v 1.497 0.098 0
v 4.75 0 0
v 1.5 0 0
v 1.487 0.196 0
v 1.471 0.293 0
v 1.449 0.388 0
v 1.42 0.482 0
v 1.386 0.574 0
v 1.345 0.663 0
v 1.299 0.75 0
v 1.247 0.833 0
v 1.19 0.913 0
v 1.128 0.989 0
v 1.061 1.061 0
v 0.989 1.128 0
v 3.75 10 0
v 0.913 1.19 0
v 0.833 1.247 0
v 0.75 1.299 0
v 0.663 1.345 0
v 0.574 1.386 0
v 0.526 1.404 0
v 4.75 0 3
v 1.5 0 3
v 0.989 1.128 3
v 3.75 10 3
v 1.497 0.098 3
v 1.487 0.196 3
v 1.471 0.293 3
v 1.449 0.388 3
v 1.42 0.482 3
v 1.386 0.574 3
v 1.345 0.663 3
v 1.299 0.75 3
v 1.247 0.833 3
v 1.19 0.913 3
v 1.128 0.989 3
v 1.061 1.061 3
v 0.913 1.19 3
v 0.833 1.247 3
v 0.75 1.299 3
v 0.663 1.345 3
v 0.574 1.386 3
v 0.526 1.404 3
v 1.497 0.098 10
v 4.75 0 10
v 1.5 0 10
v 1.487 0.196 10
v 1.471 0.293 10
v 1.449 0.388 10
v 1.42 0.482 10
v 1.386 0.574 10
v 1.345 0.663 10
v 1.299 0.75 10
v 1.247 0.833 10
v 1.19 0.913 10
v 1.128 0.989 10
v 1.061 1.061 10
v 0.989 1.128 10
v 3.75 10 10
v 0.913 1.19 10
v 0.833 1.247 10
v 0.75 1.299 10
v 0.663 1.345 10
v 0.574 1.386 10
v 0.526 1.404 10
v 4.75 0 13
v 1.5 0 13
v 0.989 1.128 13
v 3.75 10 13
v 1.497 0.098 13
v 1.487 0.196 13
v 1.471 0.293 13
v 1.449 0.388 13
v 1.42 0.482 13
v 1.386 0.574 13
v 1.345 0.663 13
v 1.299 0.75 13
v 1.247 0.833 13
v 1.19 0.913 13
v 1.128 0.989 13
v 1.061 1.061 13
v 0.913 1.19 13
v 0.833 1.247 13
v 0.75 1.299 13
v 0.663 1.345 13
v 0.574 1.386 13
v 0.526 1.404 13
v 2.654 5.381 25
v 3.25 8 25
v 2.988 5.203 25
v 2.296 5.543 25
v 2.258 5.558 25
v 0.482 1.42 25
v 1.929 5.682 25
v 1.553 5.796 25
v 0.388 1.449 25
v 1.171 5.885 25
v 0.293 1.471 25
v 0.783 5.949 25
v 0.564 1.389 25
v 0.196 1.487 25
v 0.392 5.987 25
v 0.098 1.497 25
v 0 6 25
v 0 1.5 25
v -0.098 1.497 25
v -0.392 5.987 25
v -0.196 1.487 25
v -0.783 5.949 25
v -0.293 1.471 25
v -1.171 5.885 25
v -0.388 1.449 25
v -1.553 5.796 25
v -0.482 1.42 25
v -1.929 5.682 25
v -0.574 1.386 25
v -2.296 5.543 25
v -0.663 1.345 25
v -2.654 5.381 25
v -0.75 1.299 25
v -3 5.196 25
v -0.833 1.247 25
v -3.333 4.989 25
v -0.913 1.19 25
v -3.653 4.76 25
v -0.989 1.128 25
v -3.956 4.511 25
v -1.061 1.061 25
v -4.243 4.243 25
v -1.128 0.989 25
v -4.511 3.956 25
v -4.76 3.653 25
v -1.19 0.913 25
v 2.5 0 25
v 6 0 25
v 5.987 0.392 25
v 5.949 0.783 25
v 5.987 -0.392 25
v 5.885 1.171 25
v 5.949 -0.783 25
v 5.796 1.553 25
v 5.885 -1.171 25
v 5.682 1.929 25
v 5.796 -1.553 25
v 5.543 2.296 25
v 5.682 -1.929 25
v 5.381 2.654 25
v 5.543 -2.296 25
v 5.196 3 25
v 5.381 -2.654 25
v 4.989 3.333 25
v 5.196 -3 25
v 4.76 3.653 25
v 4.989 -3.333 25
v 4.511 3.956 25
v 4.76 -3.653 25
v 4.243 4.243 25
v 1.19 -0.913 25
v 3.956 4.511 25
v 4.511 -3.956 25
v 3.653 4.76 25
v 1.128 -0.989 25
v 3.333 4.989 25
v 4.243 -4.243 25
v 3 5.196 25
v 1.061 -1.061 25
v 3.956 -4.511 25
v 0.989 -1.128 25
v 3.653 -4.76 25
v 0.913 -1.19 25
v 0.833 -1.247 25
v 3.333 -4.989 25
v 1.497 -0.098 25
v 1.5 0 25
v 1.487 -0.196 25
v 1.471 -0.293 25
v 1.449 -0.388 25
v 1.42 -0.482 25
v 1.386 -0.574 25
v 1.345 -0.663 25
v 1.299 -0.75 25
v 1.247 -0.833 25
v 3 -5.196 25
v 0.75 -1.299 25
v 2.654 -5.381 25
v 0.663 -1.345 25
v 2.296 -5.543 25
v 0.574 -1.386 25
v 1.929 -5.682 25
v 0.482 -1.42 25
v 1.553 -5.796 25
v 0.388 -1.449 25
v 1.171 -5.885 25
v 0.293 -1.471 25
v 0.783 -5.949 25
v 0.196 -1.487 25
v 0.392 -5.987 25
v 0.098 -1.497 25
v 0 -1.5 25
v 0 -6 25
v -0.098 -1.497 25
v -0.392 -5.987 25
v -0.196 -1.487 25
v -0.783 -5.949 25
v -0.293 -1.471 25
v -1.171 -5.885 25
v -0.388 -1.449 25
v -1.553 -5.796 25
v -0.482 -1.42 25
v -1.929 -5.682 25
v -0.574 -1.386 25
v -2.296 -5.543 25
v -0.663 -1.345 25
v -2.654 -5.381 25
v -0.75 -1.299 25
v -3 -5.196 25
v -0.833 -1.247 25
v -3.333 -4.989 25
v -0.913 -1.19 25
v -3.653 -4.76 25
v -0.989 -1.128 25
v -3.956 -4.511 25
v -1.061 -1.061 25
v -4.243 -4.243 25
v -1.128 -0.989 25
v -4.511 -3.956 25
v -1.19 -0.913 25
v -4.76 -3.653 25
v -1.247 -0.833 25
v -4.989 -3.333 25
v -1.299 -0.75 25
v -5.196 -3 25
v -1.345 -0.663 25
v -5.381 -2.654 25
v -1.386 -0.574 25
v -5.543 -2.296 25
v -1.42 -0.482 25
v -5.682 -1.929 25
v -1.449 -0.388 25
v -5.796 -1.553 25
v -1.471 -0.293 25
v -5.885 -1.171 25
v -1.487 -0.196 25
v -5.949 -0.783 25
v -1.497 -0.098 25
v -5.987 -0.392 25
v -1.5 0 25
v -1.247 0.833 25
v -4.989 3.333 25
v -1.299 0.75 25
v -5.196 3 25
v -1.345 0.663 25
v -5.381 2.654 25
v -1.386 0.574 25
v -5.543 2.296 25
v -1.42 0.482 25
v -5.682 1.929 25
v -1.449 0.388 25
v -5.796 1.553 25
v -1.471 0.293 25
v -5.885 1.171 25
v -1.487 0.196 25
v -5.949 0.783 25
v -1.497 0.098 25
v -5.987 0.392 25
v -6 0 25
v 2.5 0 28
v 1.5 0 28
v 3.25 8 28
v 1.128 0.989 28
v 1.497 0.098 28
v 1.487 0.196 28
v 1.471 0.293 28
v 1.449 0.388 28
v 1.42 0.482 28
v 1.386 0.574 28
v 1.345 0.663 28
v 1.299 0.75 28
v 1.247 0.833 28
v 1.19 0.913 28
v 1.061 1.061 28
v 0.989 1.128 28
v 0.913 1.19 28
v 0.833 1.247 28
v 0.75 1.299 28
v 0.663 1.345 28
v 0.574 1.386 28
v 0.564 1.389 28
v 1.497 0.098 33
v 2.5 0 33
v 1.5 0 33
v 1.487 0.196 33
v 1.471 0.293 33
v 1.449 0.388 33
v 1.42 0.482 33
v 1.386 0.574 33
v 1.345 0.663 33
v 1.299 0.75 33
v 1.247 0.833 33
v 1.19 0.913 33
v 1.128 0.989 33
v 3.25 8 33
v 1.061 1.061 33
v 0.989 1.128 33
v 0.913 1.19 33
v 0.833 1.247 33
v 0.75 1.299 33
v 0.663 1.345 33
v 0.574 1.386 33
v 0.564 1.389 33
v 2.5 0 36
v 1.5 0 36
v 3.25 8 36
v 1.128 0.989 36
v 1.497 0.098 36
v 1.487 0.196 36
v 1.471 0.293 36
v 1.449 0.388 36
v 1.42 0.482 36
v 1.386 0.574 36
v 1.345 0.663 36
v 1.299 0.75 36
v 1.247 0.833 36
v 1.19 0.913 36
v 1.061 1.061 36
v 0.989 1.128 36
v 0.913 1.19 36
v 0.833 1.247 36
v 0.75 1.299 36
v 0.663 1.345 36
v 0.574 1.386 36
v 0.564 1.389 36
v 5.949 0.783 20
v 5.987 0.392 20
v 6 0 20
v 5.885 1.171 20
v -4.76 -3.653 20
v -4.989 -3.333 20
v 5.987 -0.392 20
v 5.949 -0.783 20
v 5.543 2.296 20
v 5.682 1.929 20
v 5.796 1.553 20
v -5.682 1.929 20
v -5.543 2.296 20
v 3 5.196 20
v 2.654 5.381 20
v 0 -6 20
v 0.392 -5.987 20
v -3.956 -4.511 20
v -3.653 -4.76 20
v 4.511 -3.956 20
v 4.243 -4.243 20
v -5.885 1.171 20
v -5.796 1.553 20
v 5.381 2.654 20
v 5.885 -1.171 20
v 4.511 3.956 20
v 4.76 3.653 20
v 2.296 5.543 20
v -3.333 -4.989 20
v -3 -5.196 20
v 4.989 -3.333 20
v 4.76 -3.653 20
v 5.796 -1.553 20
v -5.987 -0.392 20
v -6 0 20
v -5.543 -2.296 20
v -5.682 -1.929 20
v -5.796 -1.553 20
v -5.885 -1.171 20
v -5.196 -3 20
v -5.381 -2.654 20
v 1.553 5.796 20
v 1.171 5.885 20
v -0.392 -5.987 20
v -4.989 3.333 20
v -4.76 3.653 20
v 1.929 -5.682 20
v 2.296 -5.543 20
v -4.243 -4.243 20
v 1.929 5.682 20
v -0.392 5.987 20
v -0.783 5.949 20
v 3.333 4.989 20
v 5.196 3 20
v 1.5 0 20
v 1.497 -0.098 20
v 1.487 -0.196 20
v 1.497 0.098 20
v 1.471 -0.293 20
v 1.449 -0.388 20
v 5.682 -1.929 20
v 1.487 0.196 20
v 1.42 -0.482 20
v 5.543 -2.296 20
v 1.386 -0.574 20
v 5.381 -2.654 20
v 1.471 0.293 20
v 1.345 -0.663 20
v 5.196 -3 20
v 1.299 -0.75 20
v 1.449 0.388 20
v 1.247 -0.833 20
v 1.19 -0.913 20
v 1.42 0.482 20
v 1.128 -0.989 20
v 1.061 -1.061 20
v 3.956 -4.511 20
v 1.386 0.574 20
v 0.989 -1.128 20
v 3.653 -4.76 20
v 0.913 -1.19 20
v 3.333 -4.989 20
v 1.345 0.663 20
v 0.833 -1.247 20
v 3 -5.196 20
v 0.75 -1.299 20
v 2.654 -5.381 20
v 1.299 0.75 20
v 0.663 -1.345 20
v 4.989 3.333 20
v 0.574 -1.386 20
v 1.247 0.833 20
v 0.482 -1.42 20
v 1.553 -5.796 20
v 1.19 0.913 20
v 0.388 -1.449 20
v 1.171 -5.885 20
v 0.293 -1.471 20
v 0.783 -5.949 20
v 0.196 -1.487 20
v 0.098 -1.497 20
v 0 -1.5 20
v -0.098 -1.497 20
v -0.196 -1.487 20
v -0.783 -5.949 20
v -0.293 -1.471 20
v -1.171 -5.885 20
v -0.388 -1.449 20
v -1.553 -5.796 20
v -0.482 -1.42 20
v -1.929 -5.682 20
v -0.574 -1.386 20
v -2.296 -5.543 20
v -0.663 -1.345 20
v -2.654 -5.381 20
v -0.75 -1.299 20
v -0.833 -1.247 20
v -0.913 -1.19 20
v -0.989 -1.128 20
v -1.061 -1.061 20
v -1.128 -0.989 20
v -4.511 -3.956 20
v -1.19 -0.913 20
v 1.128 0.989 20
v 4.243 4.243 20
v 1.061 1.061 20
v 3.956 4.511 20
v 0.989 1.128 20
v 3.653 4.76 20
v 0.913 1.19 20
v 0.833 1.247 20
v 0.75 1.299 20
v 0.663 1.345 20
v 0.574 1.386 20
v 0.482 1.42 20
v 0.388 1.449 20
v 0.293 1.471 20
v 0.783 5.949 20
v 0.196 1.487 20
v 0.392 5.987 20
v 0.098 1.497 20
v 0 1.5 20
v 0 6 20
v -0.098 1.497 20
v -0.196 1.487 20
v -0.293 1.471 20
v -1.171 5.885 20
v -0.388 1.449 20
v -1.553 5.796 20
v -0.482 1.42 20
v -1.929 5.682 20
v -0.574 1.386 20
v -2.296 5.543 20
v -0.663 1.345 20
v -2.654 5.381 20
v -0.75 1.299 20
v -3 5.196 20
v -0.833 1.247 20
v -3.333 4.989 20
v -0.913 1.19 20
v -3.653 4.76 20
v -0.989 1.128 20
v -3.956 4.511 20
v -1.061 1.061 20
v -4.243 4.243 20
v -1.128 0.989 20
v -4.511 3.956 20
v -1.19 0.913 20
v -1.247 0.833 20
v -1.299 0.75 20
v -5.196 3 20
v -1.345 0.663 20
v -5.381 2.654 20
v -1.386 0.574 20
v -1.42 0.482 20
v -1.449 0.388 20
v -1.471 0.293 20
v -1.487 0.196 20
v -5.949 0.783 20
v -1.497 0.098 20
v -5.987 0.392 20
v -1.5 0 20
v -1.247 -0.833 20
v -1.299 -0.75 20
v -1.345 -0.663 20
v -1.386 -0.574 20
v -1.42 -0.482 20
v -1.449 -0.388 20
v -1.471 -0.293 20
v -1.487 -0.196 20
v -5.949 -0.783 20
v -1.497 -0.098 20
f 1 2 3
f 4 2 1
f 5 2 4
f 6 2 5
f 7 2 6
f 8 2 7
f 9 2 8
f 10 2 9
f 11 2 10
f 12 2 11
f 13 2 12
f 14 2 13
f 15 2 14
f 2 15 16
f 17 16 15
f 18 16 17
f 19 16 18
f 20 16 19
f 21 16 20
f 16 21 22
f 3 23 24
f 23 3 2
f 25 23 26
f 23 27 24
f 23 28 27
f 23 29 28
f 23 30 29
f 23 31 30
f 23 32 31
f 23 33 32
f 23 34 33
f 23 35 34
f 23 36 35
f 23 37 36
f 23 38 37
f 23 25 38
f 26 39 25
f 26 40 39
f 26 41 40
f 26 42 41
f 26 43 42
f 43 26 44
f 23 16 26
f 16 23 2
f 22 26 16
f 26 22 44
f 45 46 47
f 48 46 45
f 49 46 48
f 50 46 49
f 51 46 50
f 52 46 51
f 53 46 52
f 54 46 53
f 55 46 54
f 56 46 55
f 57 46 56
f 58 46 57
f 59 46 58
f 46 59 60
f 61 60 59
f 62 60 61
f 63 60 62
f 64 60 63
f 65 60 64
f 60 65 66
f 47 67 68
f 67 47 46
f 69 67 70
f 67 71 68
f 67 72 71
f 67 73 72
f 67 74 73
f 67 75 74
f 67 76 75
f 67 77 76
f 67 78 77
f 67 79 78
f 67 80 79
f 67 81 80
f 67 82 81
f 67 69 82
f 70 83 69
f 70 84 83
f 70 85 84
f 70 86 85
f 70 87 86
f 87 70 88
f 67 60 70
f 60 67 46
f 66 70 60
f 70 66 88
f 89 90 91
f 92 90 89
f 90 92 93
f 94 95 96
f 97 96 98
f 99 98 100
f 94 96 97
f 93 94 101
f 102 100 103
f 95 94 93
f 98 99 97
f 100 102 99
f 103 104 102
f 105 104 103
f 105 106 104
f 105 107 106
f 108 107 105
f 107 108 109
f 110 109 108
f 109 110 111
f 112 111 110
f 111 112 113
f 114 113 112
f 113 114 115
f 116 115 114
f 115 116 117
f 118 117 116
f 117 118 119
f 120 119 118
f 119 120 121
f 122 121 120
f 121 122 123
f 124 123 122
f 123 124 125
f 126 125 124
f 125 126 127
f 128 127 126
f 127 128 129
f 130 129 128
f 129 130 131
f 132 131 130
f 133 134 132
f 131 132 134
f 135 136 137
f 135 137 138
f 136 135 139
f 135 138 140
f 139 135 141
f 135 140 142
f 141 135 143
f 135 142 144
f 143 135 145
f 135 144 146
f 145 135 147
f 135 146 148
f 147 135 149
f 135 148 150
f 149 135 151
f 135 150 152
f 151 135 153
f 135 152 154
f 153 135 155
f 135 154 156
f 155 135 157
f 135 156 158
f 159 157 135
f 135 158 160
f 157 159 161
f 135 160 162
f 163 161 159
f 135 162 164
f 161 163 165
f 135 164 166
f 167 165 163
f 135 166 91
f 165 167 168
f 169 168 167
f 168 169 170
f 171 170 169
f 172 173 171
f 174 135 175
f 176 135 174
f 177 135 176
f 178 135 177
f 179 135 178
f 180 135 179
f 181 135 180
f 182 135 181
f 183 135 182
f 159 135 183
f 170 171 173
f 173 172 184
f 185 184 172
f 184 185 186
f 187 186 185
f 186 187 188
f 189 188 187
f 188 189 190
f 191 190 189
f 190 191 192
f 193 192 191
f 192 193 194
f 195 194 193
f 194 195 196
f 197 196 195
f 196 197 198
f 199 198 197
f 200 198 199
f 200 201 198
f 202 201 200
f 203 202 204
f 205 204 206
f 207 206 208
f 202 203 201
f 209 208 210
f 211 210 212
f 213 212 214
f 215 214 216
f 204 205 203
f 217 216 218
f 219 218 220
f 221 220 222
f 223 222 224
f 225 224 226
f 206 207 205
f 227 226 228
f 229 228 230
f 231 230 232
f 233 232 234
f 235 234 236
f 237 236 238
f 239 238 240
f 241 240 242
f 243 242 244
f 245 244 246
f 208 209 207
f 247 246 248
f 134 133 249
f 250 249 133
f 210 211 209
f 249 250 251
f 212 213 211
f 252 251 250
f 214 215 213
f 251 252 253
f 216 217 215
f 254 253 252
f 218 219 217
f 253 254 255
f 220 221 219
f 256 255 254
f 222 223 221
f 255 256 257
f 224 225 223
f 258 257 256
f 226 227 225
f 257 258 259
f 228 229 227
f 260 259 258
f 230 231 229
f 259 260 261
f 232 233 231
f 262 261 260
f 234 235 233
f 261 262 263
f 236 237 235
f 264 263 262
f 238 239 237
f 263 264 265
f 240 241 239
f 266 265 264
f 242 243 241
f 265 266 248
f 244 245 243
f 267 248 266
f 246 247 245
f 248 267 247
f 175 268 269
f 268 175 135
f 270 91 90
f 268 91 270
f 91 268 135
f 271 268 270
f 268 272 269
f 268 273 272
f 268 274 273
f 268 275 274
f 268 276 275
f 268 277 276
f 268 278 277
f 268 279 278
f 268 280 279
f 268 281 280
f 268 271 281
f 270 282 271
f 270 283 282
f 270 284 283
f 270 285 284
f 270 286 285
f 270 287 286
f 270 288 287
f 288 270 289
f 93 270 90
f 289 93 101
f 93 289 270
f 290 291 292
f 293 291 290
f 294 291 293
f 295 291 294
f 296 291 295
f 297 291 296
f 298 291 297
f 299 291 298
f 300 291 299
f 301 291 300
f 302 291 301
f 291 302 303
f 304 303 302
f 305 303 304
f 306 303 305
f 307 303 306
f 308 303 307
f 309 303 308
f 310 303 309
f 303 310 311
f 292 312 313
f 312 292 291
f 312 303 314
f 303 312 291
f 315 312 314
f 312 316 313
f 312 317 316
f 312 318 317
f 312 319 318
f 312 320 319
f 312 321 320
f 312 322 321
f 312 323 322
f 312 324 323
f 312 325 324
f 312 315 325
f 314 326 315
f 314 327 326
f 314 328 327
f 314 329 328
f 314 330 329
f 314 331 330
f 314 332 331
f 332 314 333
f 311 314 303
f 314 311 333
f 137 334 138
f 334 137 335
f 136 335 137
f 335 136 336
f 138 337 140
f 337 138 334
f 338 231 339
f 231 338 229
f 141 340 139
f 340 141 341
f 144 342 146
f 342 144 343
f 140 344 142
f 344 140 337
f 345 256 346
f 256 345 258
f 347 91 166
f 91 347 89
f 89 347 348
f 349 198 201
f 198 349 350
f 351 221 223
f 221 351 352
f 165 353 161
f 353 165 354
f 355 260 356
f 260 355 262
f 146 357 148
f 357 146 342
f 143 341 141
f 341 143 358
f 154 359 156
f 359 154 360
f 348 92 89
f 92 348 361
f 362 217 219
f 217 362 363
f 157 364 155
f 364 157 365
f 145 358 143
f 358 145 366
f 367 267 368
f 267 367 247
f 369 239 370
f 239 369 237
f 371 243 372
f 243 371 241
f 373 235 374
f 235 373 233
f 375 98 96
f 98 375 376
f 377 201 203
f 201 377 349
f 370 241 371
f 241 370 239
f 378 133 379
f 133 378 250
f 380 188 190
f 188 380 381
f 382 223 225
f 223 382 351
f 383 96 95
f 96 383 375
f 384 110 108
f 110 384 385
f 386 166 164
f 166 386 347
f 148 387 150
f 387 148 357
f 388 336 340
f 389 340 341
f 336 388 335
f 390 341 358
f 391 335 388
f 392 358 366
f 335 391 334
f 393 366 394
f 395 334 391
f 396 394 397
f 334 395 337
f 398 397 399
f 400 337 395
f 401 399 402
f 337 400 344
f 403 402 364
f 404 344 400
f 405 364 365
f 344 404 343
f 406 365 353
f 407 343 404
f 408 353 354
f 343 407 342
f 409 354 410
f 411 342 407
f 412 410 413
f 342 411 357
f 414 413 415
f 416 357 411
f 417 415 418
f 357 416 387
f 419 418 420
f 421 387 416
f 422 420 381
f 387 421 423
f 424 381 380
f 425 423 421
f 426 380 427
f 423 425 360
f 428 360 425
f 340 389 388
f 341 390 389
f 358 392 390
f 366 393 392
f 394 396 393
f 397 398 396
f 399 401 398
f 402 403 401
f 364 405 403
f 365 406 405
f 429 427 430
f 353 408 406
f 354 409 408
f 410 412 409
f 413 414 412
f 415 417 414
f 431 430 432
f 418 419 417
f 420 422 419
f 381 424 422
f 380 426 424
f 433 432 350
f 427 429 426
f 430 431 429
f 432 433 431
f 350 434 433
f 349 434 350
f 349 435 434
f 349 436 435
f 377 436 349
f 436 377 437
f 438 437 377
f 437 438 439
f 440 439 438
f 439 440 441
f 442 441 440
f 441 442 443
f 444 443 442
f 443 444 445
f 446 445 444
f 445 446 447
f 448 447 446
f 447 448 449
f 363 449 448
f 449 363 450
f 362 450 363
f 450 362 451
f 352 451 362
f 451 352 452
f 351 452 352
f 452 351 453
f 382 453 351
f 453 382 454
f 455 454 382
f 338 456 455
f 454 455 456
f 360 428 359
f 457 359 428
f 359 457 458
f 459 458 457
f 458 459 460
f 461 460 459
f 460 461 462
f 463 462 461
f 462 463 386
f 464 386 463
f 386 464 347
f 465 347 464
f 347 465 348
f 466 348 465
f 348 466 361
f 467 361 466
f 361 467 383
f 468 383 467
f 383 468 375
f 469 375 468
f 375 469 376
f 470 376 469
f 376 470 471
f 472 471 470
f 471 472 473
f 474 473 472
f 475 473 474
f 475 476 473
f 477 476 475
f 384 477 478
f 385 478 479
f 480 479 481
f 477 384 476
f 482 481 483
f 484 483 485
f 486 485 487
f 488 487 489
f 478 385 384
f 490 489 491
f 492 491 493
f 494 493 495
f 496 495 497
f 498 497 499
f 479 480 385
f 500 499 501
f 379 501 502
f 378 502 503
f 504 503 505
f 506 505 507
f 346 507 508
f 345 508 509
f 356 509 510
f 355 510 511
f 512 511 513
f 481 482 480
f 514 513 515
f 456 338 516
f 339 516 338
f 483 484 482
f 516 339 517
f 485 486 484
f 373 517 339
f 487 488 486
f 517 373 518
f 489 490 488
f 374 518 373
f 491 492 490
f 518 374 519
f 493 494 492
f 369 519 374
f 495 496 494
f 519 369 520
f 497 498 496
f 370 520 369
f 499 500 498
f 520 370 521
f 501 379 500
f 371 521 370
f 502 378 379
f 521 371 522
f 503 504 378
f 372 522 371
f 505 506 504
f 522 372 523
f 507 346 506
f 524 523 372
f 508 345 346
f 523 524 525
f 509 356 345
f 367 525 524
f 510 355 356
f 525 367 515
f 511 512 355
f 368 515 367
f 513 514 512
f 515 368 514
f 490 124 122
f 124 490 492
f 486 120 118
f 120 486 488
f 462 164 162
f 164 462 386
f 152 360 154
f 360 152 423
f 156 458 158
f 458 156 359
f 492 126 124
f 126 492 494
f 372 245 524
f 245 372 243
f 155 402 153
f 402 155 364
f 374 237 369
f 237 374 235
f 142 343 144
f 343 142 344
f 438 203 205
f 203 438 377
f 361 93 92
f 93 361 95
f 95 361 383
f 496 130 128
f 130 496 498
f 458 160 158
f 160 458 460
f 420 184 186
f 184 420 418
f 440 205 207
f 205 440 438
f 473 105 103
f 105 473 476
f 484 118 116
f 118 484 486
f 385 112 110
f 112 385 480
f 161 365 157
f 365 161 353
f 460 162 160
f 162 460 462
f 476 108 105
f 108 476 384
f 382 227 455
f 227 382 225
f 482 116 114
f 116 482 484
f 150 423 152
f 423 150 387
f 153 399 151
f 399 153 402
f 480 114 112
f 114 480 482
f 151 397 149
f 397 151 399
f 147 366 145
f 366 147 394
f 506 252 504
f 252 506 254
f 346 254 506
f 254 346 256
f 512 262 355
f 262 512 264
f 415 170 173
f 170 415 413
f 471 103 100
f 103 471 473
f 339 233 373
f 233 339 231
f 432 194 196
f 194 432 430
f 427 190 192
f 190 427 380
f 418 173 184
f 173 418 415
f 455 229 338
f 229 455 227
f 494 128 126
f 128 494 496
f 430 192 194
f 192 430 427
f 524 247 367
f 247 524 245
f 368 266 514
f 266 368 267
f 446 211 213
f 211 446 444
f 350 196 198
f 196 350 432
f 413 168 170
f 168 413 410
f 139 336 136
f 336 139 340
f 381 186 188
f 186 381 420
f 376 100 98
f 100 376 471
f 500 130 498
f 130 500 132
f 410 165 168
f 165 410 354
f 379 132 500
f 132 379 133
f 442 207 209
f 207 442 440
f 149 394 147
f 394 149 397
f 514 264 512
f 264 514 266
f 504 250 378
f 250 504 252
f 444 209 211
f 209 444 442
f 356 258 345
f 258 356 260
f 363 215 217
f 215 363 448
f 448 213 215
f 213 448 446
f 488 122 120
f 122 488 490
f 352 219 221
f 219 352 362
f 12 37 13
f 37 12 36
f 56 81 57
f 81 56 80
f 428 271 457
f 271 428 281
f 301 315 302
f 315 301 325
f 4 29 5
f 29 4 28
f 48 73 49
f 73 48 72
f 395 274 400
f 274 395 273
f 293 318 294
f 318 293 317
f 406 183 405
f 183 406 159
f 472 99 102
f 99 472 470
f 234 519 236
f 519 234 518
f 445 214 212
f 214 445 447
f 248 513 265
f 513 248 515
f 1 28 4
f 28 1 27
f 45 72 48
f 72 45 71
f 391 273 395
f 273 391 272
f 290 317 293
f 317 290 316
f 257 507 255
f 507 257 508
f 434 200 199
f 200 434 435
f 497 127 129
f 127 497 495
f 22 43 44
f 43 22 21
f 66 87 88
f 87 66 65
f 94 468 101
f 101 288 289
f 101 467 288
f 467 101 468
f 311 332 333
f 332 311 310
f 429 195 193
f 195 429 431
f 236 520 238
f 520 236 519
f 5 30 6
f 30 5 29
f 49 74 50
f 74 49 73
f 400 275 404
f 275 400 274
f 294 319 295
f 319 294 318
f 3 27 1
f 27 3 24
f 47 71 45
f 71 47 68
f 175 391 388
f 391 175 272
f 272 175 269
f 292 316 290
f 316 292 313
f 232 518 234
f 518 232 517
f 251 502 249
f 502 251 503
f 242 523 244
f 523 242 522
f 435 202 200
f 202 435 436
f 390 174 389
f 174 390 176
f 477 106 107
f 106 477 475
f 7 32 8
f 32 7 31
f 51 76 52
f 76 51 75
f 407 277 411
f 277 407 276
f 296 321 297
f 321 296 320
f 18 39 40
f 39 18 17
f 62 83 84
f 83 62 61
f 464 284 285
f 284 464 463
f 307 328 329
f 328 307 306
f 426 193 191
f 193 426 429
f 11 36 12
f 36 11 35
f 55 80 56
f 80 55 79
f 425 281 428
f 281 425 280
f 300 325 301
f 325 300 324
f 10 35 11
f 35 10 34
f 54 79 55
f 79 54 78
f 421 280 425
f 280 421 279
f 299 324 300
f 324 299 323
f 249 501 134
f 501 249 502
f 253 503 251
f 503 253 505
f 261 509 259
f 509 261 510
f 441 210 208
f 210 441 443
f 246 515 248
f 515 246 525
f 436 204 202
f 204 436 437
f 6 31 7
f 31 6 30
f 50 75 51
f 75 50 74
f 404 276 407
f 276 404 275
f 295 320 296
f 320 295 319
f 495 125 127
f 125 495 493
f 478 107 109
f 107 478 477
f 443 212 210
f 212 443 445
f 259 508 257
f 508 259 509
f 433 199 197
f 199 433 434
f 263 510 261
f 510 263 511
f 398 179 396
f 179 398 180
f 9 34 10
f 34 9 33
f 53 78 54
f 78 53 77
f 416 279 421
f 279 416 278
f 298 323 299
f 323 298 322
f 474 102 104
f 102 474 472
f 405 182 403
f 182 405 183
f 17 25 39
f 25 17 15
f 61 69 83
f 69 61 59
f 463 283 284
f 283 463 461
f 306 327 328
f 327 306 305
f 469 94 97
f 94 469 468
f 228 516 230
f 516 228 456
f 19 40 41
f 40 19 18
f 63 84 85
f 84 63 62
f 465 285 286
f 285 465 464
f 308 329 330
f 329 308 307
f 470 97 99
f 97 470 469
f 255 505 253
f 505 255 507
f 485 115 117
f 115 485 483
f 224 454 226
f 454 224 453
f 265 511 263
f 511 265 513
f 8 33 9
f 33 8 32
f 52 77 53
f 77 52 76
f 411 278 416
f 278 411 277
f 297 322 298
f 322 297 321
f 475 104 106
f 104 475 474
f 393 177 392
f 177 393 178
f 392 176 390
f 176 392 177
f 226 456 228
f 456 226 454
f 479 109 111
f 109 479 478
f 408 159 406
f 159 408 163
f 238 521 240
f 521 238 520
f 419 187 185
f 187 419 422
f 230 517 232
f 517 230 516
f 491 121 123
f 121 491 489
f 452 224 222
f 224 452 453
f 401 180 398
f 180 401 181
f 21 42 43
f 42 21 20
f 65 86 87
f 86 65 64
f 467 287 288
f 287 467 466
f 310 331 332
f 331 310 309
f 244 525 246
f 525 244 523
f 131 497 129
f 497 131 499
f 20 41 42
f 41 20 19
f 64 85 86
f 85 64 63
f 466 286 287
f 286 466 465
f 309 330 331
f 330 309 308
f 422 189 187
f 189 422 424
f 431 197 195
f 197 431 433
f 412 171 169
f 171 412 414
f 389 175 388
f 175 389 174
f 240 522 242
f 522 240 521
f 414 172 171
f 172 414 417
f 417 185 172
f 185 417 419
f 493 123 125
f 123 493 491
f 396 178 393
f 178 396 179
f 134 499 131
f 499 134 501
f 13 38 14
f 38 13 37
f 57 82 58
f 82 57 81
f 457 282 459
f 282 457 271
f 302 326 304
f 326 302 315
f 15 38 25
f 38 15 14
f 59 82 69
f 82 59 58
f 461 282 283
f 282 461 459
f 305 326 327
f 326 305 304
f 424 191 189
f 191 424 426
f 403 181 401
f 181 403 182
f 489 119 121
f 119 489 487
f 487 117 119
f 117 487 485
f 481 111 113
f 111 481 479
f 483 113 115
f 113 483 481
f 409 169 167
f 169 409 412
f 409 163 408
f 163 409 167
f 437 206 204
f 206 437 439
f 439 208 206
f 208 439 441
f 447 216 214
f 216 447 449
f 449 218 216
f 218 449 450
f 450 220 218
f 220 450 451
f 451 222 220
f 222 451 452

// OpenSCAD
// Hose-barb reducer: 8 mm ID -> 5 mm ID
// Print orientation: standing upright along +Z

$fn = 96;

// ---- Dimensions (mm) ----
id_8      = 8;    // 8 mm tubing inner diameter
id_5      = 5;    // 5 mm tubing inner diameter
bore      = 3;    // central through-bore diameter
barb_h8   = 10;   // height of each 8 mm barb
od8_bot   = 7.5;  // outer diameter of 8 mm barb at bottom
od8_top   = 9.5;  // outer diameter of 8 mm barb at top
collar_d  = 12;   // diameter of cylindrical collar
barb_h5   = 8;    // height of each 5 mm barb
od5_bot   = 6.5;  // outer diameter of 5 mm barb at bottom
od5_top   = 5.0;  // outer diameter of 5 mm barb at top
len8      = 20;   // length of 8 mm barb section
len_coll  = 5;    // length of collar section
len5      = 16;   // length of 5 mm barb section (z = 25 to z = 41)
eps       = 0.5;  // overshoot for clean cuts

// ---- Model ----
difference() {
    union() {
        // 8 mm tubing barbs (z = 0 to 20)
        for (i = [0 : 1])
            translate([0, 0, i * barb_h8])
                linear_extrude(height = bore)
                    polygon([
                        [0, 0],
                        [od8_bot / 2, barb_h8],
                        [od8_top / 2, 0]
                    ]);
        // collar (z = 20 to 25)
        translate([0, 0, len8])
            cylinder(d = collar_d, h = len_coll);
        // 5 mm tubing barbs (z = 25 to 41)
        for (i = [0 : 1])
            translate([0, 0, len8 + len_coll + i * barb_h5])
                linear_extrude(height = bore)
                    polygon([
                        [0, 0],
                        [od5_bot / 2, barb_h5],
                        [od5_top / 2, 0]
                    ]);
    }
    // central bore through full length
    translate([0, 0, -eps])
        cylinder(d = bore, h = len8 + len_coll + 2 * barb_h5 + 2 * eps);
}
